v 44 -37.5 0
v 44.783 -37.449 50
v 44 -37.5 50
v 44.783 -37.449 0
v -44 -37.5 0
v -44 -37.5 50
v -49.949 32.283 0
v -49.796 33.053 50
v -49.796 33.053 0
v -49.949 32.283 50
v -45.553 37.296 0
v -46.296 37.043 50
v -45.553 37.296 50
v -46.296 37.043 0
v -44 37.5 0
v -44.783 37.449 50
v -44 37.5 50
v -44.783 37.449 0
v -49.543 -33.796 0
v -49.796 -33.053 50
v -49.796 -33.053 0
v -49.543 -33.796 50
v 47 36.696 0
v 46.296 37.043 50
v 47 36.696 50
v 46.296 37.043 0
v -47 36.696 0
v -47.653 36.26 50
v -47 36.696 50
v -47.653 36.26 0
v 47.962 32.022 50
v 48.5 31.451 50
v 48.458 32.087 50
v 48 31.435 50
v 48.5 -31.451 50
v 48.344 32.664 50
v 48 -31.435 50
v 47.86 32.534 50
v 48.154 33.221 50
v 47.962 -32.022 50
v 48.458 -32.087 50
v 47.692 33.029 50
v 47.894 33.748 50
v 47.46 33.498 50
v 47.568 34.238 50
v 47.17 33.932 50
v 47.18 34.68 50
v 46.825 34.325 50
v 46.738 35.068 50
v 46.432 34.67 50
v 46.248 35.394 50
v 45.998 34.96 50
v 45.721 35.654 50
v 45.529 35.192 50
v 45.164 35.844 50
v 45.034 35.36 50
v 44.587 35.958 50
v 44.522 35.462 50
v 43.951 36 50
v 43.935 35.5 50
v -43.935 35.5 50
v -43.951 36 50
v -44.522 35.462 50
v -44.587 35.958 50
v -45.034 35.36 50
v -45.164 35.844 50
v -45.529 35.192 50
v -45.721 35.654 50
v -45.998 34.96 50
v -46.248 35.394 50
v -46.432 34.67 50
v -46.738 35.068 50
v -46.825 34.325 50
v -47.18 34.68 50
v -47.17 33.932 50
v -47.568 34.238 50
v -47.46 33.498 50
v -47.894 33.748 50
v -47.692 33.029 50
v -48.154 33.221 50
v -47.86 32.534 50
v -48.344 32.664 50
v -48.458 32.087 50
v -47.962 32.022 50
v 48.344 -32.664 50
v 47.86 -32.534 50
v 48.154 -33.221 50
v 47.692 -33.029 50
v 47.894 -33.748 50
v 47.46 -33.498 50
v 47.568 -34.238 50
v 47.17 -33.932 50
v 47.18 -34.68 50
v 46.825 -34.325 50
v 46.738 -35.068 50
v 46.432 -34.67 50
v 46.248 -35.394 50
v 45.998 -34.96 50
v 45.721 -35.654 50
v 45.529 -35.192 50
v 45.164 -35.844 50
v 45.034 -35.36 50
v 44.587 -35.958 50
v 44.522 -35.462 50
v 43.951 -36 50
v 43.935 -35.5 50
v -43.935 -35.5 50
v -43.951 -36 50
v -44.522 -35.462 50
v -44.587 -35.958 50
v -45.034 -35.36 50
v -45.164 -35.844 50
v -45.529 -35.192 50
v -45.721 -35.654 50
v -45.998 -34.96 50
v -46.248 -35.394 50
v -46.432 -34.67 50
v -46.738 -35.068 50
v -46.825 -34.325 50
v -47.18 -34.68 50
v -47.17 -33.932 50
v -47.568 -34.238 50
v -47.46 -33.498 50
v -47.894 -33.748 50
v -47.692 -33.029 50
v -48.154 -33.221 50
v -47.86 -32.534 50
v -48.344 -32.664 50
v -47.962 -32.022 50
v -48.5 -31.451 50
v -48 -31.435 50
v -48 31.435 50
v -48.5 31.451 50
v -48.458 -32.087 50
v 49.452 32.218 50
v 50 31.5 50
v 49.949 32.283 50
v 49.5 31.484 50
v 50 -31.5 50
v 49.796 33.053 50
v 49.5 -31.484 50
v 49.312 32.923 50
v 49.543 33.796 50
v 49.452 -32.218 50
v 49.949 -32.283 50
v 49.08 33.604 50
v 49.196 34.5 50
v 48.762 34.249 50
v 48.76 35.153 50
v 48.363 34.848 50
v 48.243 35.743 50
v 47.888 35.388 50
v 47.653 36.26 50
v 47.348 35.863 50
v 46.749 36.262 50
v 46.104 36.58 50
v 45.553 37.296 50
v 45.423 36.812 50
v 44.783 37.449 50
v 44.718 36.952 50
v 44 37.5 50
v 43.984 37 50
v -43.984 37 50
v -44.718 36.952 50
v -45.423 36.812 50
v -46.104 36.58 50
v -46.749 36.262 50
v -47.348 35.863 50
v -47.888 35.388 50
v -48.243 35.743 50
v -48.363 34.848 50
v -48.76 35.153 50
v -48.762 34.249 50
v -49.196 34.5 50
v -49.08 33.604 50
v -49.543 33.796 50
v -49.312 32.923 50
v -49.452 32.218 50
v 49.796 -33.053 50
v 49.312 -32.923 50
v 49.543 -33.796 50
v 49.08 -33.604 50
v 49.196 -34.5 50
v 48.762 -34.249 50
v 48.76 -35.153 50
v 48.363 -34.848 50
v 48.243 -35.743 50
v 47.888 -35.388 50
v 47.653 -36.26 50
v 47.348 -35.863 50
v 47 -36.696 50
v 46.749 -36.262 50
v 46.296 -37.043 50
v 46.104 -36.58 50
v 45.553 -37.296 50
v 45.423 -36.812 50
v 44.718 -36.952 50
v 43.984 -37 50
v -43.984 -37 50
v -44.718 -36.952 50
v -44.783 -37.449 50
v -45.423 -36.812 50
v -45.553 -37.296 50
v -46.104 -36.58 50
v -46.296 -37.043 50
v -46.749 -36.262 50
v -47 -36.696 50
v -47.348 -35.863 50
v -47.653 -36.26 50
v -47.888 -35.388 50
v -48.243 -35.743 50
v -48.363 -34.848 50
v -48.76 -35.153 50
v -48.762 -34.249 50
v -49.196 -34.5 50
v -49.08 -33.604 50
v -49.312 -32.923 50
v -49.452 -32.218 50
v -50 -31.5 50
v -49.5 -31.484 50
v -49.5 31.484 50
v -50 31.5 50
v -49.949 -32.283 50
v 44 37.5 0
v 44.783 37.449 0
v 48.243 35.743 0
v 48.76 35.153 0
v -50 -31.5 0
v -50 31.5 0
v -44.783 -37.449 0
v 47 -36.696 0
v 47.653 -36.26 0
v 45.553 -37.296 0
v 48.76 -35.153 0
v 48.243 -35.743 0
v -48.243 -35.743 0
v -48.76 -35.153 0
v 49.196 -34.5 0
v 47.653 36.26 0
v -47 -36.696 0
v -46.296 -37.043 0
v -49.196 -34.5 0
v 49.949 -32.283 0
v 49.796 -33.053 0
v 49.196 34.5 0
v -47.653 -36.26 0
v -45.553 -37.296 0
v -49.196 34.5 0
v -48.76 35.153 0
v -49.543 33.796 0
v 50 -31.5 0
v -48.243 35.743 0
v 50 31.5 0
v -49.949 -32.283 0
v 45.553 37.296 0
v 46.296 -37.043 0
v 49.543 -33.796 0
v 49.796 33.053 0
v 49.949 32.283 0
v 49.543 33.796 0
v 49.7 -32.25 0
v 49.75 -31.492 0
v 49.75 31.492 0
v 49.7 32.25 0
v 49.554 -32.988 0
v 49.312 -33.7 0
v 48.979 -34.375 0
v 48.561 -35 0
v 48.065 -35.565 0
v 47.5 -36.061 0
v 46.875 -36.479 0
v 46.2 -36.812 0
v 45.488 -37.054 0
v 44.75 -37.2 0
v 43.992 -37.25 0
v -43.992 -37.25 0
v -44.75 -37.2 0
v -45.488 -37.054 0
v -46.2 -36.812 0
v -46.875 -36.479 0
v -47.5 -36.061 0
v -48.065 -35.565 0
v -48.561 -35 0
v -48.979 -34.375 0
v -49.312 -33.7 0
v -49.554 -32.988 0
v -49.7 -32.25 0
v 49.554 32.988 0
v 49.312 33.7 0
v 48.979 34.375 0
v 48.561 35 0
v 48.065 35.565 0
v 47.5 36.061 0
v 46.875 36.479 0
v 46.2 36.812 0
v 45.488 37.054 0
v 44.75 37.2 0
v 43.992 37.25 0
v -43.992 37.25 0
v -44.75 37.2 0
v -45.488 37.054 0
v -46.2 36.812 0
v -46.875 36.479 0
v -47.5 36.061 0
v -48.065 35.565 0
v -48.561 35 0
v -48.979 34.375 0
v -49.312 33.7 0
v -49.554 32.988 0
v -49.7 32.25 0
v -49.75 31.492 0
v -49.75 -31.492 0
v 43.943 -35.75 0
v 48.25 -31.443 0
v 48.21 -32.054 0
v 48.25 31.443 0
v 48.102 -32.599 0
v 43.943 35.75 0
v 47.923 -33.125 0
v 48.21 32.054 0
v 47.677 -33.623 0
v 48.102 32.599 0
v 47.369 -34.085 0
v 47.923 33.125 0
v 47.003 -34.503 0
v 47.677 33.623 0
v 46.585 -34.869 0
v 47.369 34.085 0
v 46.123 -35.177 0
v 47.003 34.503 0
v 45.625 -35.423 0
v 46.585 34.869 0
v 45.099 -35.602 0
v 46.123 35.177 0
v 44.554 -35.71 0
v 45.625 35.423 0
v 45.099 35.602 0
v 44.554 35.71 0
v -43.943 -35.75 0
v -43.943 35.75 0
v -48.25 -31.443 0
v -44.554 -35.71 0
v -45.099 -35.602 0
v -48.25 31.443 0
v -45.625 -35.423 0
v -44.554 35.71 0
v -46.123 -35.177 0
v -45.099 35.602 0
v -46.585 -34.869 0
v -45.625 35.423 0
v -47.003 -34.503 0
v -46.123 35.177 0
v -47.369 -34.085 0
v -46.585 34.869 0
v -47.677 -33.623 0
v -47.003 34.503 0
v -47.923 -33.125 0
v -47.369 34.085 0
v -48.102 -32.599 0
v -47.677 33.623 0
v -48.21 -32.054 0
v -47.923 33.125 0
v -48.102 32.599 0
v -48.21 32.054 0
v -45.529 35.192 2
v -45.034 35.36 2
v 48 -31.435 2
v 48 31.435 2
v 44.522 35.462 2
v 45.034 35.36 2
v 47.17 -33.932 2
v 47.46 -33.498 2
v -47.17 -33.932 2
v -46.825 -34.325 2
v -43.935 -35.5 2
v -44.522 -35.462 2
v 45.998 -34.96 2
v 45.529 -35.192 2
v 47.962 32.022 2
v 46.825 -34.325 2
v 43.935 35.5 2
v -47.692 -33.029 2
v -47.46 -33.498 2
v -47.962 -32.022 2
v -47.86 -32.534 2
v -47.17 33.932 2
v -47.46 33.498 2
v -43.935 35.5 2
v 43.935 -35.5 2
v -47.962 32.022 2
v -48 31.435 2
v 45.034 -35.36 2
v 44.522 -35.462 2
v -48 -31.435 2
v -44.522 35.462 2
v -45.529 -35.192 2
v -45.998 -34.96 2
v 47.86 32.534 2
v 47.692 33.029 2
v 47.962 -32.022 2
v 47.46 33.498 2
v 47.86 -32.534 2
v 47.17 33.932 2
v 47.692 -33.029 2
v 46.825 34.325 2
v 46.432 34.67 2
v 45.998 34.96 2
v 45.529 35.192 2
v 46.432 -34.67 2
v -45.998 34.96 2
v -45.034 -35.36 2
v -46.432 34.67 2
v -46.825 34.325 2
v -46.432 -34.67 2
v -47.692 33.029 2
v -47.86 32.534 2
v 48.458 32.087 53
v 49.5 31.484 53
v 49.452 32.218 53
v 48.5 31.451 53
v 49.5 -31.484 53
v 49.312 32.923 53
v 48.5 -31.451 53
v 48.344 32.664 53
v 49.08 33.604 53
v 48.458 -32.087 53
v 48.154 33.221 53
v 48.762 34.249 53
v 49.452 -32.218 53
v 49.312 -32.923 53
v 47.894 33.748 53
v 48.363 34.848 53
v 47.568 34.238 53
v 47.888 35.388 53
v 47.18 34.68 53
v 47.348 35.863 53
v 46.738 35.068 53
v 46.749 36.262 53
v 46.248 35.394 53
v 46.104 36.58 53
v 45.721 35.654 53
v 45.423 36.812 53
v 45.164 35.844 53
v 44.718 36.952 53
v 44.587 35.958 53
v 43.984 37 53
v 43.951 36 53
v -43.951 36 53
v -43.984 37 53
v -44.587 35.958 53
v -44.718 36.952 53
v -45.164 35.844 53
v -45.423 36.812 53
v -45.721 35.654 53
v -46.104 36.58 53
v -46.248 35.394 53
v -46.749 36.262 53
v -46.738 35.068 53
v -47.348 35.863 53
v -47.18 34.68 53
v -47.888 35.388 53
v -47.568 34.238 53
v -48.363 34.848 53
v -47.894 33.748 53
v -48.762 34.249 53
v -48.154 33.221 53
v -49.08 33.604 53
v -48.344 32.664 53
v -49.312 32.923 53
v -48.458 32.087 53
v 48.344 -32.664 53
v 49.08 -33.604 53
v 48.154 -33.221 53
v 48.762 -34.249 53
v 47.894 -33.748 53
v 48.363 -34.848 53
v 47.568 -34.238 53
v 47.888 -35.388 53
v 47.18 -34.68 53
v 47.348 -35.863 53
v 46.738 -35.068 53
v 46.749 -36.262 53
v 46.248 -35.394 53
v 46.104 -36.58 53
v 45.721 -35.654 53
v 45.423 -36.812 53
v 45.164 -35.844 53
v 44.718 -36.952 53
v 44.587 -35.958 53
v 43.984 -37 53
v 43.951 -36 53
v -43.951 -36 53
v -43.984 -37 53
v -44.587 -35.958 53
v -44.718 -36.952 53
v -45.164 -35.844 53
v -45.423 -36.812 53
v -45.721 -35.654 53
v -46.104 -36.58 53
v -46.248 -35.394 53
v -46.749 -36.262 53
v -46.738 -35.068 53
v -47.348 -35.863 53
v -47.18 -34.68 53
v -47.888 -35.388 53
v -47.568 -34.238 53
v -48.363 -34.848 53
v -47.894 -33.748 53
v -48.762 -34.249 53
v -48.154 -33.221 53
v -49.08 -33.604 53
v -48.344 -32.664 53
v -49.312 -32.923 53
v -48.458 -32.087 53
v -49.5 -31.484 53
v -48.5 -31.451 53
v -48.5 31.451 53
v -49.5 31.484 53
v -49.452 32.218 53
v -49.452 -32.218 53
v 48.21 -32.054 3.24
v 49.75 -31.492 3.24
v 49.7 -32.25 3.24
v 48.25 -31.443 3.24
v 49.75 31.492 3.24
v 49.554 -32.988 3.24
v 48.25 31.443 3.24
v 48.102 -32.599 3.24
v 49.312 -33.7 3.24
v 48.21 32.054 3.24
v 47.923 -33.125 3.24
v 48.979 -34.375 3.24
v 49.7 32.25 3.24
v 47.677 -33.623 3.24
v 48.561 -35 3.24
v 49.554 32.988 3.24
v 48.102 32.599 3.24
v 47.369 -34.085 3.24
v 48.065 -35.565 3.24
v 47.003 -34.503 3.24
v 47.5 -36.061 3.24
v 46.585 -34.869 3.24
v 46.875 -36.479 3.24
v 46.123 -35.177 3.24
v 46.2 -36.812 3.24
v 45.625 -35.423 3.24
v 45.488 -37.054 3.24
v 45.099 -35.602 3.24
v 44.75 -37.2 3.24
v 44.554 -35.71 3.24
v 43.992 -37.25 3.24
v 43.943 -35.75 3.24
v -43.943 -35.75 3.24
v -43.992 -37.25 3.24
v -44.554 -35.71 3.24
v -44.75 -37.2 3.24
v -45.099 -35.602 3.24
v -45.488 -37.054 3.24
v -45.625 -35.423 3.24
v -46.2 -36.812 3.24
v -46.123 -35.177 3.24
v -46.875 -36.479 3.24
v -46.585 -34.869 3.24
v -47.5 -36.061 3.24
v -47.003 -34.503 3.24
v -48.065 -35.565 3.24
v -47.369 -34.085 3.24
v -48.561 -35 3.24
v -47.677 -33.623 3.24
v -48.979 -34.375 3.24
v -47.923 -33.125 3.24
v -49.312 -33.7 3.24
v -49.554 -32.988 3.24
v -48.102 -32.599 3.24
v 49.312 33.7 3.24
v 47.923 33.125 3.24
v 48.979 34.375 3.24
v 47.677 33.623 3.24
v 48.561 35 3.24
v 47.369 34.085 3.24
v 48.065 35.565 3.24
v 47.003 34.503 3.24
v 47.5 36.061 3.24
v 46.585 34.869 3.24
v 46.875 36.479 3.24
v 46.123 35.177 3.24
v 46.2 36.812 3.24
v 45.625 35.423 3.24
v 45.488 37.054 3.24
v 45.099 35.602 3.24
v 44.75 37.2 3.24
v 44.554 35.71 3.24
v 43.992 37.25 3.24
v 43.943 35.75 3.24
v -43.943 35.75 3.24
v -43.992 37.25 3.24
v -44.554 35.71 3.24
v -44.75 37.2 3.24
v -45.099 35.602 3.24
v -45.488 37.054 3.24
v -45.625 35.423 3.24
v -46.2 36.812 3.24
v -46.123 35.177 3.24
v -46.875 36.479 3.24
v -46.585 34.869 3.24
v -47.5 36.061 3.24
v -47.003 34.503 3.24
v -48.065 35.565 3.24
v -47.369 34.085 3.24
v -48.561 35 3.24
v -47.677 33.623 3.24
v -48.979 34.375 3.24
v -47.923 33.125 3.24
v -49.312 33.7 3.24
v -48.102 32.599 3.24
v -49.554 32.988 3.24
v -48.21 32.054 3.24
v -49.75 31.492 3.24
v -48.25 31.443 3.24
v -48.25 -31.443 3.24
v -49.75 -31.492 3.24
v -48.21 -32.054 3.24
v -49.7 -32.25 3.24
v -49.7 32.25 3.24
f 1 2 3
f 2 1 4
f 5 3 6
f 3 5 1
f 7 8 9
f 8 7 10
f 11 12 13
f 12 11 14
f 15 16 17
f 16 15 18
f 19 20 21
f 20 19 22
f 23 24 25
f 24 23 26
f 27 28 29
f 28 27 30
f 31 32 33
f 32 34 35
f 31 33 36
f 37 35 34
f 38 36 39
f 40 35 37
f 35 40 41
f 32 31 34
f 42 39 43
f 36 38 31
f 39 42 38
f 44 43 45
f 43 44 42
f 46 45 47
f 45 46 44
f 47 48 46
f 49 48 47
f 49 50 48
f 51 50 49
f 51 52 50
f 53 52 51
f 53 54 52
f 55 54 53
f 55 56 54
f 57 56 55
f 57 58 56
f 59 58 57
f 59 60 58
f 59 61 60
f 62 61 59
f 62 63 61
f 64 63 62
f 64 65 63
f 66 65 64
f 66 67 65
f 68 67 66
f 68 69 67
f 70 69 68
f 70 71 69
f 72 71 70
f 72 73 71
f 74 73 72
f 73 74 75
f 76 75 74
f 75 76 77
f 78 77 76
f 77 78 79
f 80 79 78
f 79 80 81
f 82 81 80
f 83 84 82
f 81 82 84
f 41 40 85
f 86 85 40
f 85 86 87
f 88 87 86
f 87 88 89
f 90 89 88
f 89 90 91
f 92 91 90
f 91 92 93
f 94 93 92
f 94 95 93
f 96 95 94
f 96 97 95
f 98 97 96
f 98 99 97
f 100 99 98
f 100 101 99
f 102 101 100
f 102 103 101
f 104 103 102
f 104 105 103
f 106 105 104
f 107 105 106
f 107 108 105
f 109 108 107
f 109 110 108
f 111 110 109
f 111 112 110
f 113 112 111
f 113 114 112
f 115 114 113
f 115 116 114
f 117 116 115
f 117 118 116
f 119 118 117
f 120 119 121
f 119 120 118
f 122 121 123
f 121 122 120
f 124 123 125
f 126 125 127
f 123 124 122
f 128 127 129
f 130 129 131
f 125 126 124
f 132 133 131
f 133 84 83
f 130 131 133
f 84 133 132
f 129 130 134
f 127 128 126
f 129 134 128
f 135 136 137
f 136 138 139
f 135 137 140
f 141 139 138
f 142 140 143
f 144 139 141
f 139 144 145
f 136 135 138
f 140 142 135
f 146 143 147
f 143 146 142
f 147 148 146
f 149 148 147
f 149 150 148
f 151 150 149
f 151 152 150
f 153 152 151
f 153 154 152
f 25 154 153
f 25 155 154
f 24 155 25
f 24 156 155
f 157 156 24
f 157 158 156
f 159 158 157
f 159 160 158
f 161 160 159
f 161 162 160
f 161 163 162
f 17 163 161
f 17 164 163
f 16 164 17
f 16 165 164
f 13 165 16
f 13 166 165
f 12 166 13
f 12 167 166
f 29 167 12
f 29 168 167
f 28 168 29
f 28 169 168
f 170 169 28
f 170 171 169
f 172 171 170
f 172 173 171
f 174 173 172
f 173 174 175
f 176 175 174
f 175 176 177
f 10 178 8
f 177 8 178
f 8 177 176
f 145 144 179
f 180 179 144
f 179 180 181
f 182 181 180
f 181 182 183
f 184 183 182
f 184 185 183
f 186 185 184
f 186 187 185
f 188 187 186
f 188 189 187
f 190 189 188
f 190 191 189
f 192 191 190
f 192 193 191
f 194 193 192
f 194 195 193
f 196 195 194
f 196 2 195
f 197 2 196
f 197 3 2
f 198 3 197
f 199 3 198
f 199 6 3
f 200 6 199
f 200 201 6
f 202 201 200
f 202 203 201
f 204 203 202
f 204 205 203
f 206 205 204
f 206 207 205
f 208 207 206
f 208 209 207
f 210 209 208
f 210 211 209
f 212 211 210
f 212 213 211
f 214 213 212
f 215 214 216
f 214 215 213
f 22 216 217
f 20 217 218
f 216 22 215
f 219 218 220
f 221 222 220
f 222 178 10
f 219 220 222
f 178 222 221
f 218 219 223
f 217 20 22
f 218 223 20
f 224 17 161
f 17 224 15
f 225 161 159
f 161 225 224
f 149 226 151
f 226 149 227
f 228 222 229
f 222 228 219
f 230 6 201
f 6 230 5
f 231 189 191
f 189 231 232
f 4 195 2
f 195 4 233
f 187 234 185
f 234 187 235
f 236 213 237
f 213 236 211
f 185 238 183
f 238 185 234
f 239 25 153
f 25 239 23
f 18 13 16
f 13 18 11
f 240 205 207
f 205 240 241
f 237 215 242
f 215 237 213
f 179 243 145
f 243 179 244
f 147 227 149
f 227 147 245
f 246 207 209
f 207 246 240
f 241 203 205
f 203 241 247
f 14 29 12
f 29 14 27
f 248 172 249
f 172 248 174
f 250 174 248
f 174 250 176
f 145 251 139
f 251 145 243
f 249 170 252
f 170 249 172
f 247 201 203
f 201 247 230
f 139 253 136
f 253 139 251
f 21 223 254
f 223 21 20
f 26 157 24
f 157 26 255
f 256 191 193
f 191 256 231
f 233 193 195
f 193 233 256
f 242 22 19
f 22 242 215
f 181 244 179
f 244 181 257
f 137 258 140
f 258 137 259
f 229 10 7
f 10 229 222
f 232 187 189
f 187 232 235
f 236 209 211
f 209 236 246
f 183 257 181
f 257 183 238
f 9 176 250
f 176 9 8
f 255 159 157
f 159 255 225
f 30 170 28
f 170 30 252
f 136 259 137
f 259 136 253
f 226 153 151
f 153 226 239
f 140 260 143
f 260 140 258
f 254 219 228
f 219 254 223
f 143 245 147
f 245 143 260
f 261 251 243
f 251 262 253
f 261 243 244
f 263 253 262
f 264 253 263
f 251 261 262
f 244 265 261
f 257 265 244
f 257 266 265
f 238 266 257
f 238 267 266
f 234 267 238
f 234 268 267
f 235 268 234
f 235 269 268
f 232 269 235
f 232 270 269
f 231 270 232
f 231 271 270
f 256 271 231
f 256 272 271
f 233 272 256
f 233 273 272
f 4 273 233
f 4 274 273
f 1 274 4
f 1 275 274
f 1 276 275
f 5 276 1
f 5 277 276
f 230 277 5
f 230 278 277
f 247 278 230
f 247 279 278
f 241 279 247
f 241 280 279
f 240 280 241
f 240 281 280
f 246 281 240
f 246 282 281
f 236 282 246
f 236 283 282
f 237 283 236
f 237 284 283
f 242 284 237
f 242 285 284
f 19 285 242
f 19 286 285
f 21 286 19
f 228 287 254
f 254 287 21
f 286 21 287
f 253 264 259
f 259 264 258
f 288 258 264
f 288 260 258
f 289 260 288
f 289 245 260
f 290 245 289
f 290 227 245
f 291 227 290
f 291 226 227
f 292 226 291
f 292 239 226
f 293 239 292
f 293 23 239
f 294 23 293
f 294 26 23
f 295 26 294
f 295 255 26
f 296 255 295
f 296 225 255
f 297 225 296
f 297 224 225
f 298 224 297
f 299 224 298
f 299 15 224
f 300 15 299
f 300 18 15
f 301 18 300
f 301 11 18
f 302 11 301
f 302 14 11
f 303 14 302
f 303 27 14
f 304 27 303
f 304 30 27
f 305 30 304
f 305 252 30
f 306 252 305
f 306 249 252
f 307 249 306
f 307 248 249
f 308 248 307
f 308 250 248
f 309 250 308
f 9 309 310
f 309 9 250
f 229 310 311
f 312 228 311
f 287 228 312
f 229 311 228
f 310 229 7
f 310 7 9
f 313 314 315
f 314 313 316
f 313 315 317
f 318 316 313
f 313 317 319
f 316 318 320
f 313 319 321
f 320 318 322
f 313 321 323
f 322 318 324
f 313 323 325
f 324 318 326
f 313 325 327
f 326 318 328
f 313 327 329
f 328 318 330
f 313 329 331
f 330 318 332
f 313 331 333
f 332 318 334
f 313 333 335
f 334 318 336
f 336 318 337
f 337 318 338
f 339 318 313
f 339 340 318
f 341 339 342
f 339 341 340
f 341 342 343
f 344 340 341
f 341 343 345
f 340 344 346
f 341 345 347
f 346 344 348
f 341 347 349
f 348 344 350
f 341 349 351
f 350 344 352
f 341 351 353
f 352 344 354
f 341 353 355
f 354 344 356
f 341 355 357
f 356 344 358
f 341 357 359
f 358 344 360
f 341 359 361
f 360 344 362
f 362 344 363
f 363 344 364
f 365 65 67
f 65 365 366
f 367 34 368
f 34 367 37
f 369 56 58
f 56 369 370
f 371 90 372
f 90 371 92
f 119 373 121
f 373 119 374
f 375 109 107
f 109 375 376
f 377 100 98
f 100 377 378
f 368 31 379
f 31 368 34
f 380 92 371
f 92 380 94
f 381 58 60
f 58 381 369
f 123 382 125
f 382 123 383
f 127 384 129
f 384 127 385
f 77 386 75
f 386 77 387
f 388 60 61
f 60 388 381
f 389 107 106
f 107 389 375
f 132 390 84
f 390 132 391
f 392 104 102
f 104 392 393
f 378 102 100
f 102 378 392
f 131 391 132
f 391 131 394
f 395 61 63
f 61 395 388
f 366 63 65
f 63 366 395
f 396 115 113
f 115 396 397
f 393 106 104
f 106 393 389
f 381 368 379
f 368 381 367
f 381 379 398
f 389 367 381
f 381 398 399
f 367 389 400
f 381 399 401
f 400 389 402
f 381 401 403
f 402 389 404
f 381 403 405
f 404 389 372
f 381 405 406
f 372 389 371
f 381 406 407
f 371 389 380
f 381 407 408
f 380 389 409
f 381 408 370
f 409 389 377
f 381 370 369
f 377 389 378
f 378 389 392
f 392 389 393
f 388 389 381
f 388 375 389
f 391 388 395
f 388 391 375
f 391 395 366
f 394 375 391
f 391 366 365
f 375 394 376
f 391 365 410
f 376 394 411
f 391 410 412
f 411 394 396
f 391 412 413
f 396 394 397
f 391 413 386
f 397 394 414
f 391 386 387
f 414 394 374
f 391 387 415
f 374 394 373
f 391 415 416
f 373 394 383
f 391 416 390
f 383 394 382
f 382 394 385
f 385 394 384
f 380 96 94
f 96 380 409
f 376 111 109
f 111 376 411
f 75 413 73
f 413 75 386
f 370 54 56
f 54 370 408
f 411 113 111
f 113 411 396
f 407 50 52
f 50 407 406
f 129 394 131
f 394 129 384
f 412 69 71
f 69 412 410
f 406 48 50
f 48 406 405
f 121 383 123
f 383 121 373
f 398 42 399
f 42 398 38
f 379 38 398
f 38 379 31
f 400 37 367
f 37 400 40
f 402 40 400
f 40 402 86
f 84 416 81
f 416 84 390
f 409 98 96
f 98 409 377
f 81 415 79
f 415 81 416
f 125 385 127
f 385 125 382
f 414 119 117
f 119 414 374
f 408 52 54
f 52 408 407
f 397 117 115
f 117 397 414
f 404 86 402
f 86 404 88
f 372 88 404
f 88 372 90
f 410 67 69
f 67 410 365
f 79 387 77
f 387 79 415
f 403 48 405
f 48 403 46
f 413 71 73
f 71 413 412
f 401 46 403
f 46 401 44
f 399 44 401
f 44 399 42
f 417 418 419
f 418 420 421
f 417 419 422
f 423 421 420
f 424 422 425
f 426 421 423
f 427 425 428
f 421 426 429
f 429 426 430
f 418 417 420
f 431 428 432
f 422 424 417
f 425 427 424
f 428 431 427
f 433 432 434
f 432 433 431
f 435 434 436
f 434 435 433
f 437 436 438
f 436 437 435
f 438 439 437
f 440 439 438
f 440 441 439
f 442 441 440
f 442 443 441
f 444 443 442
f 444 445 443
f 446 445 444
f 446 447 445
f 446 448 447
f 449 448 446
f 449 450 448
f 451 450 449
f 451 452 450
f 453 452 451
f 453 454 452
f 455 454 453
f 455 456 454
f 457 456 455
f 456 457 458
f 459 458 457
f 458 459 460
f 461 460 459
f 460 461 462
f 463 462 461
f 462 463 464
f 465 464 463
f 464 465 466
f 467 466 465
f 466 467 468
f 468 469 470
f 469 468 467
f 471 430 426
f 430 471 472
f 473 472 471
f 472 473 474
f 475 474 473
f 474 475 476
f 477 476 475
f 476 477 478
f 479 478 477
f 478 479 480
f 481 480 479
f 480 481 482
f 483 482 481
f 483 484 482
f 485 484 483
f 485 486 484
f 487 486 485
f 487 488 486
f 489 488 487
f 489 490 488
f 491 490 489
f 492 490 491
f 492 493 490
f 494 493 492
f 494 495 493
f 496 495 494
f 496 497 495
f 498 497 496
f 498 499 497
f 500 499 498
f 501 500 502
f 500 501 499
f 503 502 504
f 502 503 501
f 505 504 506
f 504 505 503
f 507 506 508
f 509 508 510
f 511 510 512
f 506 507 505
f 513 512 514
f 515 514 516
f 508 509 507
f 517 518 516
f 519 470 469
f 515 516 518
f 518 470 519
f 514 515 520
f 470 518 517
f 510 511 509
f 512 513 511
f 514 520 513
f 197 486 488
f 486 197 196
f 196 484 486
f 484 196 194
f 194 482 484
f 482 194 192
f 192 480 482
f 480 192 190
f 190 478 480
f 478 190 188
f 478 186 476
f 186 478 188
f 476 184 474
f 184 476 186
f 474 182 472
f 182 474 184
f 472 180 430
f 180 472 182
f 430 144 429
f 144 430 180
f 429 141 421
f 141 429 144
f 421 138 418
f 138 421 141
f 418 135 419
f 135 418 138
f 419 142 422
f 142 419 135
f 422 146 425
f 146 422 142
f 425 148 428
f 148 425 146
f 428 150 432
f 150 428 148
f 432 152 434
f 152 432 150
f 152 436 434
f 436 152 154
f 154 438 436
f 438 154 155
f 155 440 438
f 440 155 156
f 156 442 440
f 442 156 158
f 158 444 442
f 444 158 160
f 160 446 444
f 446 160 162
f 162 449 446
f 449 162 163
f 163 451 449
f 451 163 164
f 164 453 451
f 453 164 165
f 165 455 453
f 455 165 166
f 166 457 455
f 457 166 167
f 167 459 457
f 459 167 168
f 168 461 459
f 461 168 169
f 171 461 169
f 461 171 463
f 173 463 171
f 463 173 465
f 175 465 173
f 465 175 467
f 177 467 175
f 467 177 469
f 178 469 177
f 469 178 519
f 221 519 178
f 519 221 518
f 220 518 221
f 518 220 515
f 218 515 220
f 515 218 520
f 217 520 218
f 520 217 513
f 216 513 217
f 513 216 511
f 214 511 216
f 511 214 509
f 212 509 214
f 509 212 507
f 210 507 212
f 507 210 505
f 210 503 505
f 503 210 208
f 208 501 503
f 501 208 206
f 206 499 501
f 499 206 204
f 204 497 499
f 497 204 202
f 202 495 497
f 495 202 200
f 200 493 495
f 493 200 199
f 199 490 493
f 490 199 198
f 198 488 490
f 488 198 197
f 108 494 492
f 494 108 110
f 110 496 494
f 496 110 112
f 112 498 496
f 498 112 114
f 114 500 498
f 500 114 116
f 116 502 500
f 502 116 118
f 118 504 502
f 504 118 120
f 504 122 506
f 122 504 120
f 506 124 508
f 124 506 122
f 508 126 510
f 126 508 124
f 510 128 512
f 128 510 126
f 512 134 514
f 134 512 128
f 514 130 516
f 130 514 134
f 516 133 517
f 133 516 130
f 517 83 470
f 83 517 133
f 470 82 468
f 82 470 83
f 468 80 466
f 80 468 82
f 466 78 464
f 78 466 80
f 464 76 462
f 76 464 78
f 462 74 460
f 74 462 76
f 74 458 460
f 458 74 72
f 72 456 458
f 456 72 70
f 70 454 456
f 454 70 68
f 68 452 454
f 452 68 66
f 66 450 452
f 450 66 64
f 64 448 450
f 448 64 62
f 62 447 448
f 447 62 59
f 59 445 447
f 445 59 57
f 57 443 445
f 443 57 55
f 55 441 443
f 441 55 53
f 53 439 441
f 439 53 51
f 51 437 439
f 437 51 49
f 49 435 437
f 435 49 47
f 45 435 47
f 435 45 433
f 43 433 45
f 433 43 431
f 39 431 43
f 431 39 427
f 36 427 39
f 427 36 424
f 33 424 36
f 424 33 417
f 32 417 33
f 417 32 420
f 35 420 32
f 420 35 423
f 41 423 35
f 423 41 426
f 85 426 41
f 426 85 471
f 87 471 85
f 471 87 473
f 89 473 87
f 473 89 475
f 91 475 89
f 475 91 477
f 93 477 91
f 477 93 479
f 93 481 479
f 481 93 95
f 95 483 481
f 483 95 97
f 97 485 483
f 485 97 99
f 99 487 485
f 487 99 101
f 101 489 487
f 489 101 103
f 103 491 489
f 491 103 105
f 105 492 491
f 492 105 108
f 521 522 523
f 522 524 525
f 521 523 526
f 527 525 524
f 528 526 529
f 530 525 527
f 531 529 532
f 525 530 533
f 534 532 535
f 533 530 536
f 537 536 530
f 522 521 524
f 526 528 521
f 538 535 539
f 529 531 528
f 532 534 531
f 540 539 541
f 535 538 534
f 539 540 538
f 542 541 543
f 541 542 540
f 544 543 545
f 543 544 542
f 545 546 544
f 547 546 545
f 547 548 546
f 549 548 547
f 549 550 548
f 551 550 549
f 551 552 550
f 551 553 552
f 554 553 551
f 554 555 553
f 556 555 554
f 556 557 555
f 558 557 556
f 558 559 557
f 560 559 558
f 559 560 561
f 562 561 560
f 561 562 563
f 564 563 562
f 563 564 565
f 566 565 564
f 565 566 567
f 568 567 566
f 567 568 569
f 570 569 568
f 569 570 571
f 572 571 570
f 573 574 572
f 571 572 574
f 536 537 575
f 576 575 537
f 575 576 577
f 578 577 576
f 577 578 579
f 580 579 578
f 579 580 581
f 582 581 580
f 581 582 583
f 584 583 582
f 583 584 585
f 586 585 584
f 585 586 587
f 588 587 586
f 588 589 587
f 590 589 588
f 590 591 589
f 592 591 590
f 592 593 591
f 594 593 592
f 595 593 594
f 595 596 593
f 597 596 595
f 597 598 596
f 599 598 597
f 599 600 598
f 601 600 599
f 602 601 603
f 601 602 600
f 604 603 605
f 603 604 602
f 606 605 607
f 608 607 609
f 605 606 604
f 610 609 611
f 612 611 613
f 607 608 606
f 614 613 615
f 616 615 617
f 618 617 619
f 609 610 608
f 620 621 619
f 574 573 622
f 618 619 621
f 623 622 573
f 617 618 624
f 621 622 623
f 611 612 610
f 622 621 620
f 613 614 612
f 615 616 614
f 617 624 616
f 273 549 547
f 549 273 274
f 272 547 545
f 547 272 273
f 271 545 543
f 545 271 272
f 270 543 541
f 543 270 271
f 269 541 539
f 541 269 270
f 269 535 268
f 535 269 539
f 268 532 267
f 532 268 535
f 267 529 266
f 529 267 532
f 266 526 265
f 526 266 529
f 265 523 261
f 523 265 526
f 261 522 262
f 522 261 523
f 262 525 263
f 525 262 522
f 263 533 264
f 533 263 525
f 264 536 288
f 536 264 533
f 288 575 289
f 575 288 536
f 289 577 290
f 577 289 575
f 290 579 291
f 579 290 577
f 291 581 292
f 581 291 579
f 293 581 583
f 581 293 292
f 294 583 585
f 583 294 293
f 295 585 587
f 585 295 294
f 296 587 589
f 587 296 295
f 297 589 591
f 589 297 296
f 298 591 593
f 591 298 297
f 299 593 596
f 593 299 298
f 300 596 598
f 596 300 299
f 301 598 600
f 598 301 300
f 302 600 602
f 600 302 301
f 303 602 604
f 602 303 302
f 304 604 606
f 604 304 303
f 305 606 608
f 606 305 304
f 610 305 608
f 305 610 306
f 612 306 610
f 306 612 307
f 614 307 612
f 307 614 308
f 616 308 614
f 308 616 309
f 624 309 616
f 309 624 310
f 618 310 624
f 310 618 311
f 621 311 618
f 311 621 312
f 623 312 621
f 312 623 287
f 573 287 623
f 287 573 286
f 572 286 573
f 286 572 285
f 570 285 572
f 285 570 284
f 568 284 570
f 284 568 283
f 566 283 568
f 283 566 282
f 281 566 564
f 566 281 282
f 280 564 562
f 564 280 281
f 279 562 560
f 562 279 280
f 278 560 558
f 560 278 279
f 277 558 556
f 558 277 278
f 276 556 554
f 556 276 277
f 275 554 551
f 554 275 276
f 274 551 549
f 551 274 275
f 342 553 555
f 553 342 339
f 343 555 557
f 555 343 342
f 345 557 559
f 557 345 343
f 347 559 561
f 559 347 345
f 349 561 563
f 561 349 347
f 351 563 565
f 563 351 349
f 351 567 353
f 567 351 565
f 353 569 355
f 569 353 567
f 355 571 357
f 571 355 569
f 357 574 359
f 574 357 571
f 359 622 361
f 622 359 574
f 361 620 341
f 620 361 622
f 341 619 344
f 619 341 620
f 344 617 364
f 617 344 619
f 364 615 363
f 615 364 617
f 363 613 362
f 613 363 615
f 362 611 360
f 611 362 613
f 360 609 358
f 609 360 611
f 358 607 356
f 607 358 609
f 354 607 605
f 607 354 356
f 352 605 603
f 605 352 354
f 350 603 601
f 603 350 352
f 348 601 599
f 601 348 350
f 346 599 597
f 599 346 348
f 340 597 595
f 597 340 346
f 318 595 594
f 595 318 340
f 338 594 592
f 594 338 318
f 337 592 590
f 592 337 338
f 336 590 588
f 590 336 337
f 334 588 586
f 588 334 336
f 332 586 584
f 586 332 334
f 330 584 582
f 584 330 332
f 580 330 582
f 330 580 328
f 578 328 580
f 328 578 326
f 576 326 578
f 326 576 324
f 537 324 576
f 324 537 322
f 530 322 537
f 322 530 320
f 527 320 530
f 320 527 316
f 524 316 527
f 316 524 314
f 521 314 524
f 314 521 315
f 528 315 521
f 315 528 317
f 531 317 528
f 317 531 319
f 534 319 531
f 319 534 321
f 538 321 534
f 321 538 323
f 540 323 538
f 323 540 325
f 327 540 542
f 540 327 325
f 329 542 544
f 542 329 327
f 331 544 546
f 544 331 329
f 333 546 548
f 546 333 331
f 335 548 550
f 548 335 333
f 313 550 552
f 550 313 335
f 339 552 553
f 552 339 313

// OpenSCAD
// Stackable Organizer Box — Appy's Studio parametric generator
//
// The catalogue version of this box is 4" x 3" x 2" and anything else has been
// a hand-modelled one-off with a hand-guessed price. This is the same box with
// the numbers exposed.
//
// Stacking is a raised lip on the rim and a matching groove underneath, both
// centred on the wall so the box above sits down into the one below rather
// than balancing on it.

length = 100;          // X, mm
width = 75;            // Y
height = 50;           // Z, overall
wall = 2.0;
base = 2.0;
corner = 6;            // corner radius
divisions_long = 0;    // dividers running across the length
divisions_wide = 0;    // dividers running across the width
stacking = true;
lip_height = 3;

// Printed clearance between the lip and the groove it drops into. 0.25 is the
// smallest gap that reliably separates on an unfussed FDM printer; below that
// the two fuse and you own one tall box.
fit = 0.25;

$fn = 48;

// Corner radius cannot exceed half the short side, and the cavity's radius
// follows the outer one inward.
r_out = min(corner, min(length, width) / 2 - 0.01);

module rounded(l, w, r) {
    if (r > 0.05)
        offset(r = r) square([max(0.01, l - 2 * r), max(0.01, w - 2 * r)], center = true);
    else
        square([l, w], center = true);
}

// Outer footprint, and the same footprint pulled in by `d`.
module shell(d) {
    offset(r = -d) rounded(length, width, r_out);
}

module body() {
    difference() {
        linear_extrude(height = height) shell(0);
        translate([0, 0, base])
            linear_extrude(height = height) shell(wall);
    }
}

module dividers() {
    depth = height - base;
    // Clipped to the cavity, so a divider can never poke out through a rounded
    // corner or stand proud of the rim however the numbers fall.
    intersection() {
        translate([0, 0, base])
            linear_extrude(height = depth) shell(wall);
        union() {
            if (divisions_long > 0)
                for (i = [1 : divisions_long])
                    translate([-length / 2 + i * length / (divisions_long + 1), 0, base + depth / 2])
                        cube([wall, width + 1, depth], center = true);
            if (divisions_wide > 0)
                for (i = [1 : divisions_wide])
                    translate([0, -width / 2 + i * width / (divisions_wide + 1), base + depth / 2])
                        cube([length + 1, wall, depth], center = true);
        }
    }
}

// The lip sits in the middle half of the wall: outer edge a quarter-wall in
// from the rim's outside, inner edge a quarter-wall out from its inside.
module lip_band(grow) {
    difference() {
        shell(wall * 0.25 - grow);
        shell(wall * 0.75 + grow);
    }
}

difference() {
    union() {
        body();
        if (divisions_long > 0 || divisions_wide > 0) dividers();
        if (stacking)
            translate([0, 0, height])
                linear_extrude(height = lip_height) lip_band(0);
    }

    // Groove for the lip of the box below. Cut a hair deeper than the lip is
    // tall so the boxes seat on their rims, not on the lip's top face.
    if (stacking)
        translate([0, 0, -0.01])
            linear_extrude(height = lip_height + fit)
                lip_band(fit);
}
